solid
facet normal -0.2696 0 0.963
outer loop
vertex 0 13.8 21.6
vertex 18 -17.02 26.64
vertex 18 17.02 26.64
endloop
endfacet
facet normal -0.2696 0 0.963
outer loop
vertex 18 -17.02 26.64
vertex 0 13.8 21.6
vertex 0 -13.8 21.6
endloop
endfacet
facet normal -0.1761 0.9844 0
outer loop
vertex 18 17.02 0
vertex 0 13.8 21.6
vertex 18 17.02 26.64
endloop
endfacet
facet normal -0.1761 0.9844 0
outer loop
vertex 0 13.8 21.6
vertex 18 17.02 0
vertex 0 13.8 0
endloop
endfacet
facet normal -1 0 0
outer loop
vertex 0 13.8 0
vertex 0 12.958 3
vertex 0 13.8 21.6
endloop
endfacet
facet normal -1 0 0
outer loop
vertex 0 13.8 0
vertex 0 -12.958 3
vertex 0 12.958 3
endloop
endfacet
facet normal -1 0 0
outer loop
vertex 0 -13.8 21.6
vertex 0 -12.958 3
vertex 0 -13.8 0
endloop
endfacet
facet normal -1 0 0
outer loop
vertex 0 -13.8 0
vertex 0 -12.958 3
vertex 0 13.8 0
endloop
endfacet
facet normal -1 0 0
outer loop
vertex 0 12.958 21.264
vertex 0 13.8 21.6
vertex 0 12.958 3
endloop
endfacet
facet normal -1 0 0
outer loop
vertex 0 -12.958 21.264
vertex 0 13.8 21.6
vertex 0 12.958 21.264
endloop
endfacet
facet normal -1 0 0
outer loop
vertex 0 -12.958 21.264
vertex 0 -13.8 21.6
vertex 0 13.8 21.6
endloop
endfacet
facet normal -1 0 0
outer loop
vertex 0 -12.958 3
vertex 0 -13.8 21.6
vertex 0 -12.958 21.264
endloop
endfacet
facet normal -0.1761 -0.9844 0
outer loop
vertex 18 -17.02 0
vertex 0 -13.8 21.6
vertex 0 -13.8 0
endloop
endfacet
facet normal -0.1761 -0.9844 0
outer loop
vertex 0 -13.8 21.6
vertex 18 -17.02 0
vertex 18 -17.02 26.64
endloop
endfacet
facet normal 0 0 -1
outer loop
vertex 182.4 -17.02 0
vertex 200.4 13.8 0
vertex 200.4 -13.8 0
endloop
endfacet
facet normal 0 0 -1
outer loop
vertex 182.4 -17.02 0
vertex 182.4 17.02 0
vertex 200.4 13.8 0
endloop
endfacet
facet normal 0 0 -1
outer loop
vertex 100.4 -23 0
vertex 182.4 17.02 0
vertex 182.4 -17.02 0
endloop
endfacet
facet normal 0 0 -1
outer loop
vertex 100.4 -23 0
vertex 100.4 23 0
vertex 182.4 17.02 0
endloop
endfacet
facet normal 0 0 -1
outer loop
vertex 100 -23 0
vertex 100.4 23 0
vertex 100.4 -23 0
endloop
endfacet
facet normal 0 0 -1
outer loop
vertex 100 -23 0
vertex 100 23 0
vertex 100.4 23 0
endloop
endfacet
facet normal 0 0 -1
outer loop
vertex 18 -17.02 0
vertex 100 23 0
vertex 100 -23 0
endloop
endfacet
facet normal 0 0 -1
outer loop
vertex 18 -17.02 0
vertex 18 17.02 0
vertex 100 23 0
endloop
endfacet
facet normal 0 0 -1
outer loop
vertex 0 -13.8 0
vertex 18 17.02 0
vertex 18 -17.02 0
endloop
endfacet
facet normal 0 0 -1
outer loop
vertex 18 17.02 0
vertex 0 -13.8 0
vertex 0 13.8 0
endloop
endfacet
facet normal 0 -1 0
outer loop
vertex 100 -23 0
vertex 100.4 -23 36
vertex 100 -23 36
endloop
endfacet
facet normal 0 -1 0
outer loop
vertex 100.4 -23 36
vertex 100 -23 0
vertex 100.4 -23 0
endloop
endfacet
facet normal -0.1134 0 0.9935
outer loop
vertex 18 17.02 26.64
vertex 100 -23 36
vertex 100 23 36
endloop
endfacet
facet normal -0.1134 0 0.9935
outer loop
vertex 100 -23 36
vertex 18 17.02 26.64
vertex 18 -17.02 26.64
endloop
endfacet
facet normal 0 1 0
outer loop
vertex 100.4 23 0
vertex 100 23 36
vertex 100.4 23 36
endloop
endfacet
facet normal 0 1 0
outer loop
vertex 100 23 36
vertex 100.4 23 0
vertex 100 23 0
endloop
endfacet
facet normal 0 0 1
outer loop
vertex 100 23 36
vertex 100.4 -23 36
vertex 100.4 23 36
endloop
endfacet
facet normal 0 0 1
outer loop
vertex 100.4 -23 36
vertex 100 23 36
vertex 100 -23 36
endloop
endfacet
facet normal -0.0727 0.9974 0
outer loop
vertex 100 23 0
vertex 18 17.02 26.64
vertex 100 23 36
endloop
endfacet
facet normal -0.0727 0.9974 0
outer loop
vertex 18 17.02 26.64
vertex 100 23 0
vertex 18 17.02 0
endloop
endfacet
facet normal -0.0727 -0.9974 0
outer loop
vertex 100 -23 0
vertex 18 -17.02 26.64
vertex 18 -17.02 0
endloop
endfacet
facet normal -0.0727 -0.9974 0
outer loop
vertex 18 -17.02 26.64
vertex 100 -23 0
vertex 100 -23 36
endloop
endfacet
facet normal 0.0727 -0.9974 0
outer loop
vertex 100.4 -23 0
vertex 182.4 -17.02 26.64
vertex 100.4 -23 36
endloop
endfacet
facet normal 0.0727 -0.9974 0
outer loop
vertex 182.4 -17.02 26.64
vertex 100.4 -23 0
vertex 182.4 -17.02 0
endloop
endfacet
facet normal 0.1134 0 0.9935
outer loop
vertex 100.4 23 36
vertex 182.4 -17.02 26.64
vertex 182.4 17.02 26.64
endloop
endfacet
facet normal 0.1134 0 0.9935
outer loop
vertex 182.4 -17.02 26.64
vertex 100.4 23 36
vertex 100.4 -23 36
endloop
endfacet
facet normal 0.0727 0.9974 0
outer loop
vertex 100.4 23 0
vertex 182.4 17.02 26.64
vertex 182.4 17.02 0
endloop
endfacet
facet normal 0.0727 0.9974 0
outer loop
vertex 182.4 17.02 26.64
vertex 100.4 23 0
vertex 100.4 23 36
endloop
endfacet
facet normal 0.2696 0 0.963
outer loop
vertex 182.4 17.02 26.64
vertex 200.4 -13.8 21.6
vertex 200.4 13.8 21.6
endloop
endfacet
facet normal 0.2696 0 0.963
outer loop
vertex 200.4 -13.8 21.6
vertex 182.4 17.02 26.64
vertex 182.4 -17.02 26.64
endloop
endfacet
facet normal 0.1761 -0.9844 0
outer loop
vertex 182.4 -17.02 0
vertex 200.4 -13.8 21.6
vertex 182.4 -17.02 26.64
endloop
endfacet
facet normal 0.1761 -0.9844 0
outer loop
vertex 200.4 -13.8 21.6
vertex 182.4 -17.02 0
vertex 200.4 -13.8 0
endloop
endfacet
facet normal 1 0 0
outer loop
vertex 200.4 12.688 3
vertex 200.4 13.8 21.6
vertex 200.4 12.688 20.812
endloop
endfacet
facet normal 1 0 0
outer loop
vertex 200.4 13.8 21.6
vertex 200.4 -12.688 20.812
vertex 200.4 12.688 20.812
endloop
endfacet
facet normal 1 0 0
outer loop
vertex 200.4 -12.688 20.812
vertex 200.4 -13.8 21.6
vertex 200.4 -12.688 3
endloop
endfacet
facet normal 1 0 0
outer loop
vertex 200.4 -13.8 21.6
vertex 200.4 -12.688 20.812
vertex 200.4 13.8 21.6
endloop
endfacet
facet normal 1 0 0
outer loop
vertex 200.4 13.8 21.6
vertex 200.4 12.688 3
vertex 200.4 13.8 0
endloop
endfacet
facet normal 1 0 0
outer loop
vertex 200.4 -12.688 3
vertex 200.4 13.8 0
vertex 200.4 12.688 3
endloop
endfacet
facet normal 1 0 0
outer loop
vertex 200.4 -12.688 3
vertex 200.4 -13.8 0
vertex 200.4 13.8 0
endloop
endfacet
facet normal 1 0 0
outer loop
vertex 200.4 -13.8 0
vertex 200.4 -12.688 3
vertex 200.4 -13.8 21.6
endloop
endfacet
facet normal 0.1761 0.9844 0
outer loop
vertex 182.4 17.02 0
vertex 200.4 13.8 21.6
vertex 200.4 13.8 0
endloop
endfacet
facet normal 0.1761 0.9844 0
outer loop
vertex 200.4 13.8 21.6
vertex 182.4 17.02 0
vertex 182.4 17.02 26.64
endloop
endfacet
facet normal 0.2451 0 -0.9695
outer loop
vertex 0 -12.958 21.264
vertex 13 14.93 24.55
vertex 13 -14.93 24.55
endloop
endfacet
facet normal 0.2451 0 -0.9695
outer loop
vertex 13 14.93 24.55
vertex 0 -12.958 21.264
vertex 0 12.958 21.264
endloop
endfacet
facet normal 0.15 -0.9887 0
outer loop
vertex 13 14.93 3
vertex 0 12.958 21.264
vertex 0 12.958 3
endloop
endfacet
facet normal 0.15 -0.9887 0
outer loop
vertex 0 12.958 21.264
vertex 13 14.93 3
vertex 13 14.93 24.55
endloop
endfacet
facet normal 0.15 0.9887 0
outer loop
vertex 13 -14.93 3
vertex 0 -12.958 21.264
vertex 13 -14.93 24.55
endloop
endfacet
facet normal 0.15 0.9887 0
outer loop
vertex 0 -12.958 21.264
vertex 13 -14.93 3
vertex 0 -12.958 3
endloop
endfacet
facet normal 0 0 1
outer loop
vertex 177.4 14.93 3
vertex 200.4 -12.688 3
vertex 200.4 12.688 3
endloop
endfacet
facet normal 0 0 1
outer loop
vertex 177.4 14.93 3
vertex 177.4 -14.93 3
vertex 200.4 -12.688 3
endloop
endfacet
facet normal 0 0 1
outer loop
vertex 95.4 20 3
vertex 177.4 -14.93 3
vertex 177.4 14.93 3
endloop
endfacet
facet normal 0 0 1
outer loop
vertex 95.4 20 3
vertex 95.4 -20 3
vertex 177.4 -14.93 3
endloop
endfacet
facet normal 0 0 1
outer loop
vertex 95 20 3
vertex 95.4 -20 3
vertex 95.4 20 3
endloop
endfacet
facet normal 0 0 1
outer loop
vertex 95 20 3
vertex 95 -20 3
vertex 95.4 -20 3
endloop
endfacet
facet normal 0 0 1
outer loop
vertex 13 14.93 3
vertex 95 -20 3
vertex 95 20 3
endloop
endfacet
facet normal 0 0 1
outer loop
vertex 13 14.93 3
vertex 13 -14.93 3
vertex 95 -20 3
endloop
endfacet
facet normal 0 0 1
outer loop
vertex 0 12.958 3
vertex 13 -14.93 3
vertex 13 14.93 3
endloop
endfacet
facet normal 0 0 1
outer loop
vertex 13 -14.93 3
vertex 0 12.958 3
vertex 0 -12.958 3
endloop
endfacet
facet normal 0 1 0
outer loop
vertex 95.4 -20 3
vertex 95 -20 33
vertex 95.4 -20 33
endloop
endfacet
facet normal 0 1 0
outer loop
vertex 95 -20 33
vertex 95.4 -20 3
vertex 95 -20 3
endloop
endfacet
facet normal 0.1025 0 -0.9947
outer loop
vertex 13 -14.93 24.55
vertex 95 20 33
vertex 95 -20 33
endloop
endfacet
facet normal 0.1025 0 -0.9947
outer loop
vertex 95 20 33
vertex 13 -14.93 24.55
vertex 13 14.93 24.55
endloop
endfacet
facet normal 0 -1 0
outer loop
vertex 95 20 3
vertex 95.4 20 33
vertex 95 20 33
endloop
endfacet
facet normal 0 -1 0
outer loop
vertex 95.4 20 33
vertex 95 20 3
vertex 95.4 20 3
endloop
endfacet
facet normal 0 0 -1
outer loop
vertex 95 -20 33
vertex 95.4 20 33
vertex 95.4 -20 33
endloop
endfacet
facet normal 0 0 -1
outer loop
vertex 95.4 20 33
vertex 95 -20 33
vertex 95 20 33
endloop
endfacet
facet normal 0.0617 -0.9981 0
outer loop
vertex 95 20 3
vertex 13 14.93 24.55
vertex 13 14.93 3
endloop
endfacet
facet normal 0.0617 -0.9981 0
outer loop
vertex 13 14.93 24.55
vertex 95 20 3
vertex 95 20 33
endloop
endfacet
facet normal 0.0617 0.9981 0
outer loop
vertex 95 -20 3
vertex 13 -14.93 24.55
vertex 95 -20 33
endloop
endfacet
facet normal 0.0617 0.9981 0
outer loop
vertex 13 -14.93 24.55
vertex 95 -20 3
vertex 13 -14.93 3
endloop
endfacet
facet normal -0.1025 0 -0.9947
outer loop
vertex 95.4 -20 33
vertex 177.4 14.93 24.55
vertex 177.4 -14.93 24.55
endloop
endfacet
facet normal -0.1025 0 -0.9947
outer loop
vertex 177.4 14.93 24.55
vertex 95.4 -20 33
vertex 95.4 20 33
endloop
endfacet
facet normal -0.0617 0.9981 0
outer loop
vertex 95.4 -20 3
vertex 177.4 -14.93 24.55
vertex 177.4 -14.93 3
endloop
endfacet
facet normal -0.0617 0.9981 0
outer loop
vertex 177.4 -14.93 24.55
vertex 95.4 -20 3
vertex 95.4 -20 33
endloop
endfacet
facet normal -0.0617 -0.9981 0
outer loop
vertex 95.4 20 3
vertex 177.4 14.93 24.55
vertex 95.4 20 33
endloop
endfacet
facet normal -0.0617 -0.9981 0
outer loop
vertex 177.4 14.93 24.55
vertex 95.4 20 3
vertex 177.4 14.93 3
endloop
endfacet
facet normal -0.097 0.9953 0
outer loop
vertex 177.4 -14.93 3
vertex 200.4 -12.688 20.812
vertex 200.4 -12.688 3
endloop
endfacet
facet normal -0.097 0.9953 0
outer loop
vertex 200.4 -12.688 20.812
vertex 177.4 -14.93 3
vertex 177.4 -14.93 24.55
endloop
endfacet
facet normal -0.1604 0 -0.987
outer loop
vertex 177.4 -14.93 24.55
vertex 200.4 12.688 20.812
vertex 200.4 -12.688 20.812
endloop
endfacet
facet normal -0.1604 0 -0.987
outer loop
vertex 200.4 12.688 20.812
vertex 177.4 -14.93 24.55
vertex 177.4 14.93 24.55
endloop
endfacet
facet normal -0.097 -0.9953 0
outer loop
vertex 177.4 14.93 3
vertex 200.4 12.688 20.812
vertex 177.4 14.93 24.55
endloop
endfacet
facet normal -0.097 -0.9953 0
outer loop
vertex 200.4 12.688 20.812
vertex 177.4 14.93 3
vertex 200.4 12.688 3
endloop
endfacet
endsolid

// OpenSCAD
$fn = 32;

// ----------------------------------------------------------------------
// Faired channel: 200 x 46 x 36 mm, 3 mm walls, faired ends
// ----------------------------------------------------------------------

// --- parameters (mm) ---
length = 200;             // channel length
width = 46;               // channel width at mid length
height = 36;              // channel height at mid length
wall = 3;                 // side wall thickness
floor_t = 3;              // floor thickness
end_w = 27.6;             // faired end width
end_h = 21.6;             // faired end height

difference() {
  union() {
    hull() {
      translate([0, -13.8, 0]) cube([0.4, 27.6, 21.6]);
      translate([18, -17.02, 0]) cube([0.4, 34.04, 26.64]);
    }
    hull() {
      translate([18, -17.02, 0]) cube([0.4, 34.04, 26.64]);
      translate([100, -23, 0]) cube([0.4, 46, 36]);
    }
    hull() {
      translate([100, -23, 0]) cube([0.4, 46, 36]);
      translate([182, -17.02, 0]) cube([0.4, 34.04, 26.64]);
    }
    hull() {
      translate([182, -17.02, 0]) cube([0.4, 34.04, 26.64]);
      translate([200, -13.8, 0]) cube([0.4, 27.6, 21.6]);
    }
  }
  /* cavity, 5 mm proud of both ends so the ports are cut clean */
  hull() {
    translate([-5, -12.2, 3]) cube([0.4, 24.4, 17]);
    translate([13, -14.93, 3]) cube([0.4, 29.86, 21.55]);
  }
  hull() {
    translate([13, -14.93, 3]) cube([0.4, 29.86, 21.55]);
    translate([95, -20, 3]) cube([0.4, 40, 30]);
  }
  hull() {
    translate([95, -20, 3]) cube([0.4, 40, 30]);
    translate([177, -14.93, 3]) cube([0.4, 29.86, 21.55]);
  }
  hull() {
    translate([177, -14.93, 3]) cube([0.4, 29.86, 21.55]);
    translate([205, -12.2, 3]) cube([0.4, 24.4, 17]);
  }
}
